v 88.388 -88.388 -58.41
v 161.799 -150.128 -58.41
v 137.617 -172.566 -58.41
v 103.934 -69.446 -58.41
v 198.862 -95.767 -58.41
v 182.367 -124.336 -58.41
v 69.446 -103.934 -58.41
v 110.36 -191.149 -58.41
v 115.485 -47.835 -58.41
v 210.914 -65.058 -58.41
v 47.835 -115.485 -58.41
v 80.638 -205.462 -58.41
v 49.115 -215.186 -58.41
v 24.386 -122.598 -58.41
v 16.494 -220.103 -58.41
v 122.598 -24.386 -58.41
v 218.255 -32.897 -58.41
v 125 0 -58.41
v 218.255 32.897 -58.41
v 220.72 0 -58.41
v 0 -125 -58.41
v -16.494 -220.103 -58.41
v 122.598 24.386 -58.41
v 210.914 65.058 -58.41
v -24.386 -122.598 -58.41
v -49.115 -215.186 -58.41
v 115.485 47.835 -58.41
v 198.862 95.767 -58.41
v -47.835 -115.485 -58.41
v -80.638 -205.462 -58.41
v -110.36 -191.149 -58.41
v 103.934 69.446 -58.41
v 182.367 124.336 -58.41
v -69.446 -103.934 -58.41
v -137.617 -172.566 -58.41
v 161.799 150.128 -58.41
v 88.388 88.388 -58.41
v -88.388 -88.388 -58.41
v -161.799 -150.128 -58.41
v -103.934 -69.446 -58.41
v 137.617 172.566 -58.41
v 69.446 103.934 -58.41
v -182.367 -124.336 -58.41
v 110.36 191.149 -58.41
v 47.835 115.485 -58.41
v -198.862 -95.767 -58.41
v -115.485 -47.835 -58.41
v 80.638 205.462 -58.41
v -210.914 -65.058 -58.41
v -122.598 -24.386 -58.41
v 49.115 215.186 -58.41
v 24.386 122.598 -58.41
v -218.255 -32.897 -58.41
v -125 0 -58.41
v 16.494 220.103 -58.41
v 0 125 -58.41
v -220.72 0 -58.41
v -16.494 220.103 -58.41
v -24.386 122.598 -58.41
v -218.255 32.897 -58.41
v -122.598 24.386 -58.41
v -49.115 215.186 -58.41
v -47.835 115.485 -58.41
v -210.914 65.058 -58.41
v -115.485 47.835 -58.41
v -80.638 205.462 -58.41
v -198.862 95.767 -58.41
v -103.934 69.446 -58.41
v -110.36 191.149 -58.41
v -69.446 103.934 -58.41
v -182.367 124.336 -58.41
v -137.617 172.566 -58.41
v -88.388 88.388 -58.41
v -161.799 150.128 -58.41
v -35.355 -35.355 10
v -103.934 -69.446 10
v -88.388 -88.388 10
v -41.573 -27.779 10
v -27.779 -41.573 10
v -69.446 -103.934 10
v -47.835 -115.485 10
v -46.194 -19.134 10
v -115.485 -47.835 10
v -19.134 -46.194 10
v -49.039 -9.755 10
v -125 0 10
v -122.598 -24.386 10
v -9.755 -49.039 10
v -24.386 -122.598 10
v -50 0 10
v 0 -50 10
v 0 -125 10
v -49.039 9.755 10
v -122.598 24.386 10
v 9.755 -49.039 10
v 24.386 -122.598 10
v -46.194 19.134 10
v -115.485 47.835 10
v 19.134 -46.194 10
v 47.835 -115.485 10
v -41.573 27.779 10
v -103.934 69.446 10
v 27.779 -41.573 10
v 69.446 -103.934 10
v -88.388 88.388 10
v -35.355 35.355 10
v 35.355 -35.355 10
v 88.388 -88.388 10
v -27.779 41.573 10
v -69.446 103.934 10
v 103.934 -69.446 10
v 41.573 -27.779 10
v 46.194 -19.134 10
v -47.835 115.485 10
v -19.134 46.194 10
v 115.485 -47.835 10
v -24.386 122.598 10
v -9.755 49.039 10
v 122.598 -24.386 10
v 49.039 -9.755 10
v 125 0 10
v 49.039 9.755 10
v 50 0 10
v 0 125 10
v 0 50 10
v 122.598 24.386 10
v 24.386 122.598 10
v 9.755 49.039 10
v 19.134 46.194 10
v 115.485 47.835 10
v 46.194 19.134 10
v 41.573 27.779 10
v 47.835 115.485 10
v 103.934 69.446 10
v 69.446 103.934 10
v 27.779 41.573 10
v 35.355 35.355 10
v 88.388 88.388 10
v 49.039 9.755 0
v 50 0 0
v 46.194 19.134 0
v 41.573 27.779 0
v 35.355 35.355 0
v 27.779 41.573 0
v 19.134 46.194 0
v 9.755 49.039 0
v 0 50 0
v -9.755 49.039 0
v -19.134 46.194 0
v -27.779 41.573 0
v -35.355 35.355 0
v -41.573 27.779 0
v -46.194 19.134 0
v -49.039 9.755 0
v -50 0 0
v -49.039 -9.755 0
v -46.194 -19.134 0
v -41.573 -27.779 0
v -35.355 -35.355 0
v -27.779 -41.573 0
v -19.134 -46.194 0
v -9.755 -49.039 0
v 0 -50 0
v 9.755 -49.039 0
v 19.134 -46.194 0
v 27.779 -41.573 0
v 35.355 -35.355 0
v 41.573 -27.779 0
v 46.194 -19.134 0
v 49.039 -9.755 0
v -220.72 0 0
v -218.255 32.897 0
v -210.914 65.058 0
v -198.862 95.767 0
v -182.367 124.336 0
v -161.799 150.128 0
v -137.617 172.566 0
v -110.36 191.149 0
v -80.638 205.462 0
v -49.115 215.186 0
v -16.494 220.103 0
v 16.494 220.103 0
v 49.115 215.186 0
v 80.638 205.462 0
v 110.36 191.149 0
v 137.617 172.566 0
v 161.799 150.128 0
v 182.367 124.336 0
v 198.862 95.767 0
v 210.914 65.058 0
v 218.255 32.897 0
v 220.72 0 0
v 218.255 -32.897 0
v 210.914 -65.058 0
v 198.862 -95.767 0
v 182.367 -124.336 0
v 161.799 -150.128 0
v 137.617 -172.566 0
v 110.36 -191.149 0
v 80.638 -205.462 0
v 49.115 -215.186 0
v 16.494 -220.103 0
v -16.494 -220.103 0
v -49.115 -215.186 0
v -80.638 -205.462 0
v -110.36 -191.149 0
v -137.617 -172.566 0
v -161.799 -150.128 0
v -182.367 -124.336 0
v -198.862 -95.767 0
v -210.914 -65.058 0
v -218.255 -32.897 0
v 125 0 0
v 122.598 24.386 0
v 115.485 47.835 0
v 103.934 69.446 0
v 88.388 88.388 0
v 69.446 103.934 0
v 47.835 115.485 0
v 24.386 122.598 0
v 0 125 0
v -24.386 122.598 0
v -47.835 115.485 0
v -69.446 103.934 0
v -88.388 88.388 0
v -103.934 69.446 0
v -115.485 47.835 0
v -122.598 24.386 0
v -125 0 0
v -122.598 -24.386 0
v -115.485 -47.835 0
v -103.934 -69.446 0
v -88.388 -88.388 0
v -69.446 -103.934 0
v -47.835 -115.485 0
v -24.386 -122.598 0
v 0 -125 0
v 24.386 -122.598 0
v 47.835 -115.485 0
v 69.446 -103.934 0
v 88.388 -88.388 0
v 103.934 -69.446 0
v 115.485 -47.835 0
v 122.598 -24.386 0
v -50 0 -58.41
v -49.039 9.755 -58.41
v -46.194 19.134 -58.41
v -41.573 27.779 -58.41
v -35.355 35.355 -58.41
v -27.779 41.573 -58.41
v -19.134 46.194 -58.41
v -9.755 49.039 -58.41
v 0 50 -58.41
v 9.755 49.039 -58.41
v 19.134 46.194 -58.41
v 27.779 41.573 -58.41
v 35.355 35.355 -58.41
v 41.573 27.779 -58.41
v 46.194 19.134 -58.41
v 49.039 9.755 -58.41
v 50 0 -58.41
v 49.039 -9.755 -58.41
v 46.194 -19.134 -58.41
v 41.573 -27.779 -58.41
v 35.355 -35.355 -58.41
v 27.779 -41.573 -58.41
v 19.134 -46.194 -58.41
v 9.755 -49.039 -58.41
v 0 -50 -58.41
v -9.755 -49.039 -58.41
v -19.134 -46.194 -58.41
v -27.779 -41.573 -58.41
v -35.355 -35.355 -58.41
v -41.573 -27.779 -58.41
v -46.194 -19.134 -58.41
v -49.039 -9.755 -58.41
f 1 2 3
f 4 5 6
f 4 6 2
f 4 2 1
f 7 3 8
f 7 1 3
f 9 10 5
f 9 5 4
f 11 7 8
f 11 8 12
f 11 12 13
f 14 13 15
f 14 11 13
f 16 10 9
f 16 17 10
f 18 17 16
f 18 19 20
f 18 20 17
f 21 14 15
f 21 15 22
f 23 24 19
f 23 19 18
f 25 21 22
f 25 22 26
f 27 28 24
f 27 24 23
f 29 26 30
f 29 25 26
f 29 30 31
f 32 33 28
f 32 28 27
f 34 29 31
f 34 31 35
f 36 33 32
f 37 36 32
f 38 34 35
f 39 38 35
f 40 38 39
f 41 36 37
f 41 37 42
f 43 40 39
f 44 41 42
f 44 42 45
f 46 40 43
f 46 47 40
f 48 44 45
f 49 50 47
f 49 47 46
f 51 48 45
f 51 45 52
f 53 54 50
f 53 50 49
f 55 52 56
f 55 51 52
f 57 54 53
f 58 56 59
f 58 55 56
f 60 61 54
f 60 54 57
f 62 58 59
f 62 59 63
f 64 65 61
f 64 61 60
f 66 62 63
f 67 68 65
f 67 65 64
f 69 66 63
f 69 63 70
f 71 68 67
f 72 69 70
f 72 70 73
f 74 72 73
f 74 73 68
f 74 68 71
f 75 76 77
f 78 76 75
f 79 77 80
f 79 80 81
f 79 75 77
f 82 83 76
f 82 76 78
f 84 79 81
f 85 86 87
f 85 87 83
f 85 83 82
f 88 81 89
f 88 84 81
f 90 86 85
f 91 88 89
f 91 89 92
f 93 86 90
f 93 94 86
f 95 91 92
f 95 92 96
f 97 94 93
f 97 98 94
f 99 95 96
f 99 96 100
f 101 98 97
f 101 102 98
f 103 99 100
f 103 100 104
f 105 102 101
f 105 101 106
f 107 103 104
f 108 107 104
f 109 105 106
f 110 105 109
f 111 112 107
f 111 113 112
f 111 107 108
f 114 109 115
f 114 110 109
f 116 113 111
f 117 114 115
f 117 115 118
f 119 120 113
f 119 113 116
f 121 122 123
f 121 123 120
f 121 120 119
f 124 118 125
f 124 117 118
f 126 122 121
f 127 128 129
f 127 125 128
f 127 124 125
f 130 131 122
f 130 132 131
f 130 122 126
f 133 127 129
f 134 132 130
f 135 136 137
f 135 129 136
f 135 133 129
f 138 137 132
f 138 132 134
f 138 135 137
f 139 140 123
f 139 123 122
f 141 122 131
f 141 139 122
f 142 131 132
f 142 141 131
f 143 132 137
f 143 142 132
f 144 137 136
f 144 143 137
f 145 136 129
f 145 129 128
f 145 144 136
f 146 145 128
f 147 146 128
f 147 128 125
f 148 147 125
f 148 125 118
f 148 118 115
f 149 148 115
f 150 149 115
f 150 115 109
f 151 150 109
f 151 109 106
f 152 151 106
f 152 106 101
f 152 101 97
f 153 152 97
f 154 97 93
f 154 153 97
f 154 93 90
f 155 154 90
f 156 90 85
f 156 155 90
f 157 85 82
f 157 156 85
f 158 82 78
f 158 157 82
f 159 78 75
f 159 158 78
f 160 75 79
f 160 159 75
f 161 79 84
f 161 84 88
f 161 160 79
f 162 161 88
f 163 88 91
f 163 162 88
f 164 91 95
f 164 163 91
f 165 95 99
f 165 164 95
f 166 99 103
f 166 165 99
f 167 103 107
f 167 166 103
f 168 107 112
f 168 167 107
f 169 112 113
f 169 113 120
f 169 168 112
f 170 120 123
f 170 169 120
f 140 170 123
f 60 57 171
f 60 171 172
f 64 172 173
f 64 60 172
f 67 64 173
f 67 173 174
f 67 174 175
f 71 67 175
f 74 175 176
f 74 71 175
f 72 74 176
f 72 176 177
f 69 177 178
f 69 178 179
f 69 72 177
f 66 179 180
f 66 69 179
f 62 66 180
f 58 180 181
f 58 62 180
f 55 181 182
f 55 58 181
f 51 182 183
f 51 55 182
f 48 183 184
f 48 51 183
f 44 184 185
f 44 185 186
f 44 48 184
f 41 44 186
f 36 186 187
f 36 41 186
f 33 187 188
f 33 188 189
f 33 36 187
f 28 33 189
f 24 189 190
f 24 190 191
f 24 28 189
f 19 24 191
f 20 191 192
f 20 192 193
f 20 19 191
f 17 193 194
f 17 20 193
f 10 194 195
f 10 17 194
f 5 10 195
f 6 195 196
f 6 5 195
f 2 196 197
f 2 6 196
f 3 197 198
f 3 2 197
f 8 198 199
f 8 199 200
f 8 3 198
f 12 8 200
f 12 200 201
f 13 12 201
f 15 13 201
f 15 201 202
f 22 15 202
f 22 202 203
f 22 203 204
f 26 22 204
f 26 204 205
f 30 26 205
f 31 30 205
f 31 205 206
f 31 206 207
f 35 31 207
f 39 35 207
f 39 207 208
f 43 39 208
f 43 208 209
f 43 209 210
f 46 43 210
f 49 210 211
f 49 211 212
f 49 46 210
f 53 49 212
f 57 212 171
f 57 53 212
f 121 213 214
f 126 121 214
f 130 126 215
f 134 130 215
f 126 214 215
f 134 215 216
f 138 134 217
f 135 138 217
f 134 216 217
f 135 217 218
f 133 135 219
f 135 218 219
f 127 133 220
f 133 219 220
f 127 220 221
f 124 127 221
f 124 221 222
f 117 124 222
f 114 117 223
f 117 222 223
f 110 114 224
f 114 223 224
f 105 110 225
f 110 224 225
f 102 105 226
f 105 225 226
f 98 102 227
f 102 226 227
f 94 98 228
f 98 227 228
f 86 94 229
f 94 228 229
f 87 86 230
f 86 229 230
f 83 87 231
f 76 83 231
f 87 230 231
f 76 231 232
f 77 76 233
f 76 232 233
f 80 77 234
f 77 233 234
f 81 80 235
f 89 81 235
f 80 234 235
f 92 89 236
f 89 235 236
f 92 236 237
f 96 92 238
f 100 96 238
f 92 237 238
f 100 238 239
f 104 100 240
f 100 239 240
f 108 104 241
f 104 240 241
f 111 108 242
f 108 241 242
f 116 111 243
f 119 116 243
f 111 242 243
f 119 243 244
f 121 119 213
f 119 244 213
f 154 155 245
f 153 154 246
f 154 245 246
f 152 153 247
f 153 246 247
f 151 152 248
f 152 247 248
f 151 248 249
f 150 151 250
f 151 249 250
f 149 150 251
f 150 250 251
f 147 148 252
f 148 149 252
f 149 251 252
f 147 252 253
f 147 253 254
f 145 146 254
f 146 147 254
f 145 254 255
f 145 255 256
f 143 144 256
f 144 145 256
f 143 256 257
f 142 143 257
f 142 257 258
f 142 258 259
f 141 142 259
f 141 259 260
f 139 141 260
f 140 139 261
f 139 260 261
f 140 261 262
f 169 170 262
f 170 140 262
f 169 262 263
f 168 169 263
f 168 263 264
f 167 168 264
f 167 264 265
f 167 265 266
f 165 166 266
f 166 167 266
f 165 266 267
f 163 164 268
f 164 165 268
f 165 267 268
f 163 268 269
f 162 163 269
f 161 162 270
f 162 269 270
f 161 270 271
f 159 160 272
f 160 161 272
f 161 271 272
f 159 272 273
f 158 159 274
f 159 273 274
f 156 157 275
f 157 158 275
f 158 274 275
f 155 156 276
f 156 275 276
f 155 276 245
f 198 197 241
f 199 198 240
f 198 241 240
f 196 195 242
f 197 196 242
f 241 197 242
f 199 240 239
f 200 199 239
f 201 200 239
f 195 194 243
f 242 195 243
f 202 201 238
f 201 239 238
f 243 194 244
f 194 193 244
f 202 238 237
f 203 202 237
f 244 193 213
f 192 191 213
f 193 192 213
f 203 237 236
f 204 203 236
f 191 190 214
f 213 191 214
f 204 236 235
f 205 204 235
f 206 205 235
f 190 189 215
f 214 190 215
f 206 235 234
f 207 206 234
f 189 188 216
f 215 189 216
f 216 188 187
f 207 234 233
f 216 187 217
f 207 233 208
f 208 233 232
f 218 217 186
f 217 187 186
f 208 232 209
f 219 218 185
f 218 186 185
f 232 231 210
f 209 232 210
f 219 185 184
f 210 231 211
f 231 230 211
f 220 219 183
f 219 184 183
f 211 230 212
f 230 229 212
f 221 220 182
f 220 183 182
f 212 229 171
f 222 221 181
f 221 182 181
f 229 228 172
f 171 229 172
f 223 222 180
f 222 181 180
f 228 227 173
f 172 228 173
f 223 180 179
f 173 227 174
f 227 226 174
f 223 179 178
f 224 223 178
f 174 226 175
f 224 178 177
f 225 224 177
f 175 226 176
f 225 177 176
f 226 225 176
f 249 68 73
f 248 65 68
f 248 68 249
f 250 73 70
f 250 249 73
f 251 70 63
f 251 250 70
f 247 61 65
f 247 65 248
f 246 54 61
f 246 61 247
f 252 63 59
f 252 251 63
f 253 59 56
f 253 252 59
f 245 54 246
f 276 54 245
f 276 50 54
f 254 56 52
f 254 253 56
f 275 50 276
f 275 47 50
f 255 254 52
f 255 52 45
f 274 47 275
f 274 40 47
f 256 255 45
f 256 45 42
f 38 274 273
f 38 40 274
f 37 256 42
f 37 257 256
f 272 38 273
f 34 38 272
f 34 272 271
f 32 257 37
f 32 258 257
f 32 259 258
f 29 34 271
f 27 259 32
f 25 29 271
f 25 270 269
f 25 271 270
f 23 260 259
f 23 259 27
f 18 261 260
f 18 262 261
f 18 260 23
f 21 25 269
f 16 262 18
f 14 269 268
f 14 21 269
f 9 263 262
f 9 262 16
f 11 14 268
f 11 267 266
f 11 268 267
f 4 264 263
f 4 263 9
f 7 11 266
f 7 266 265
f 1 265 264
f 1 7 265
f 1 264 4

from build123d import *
from build123d.topology import SkipClean

# Parameters (mm, degrees)
SKETCH1_R           = 125
SKETCH1_R_2         = 50
BOSS_EXTRUDE1_DEPTH = 10
BOSS_EXTRUDE2_START = 58.41
SKETCH2_R           = 220.72
SKETCH2_R_2         = 50
BOSS_EXTRUDE2_DEPTH = 58.41


with BuildPart() as part:
    # Sketch1 → Boss-Extrude1 (new body)
    with BuildSketch(Plane.XY):
        Circle(SKETCH1_R)
        Circle(SKETCH1_R_2, mode=Mode.SUBTRACT)
    extrude(amount=BOSS_EXTRUDE1_DEPTH)

    # Sketch2 → Boss-Extrude2 (add)
    with SkipClean():  # the faces are left unmerged after this step: merging them gives an invalid solid
        with BuildSketch(Plane(origin=(0, 0, 0), x_dir=(-1, 0, 0), z_dir=(0, 0, -1)).offset(BOSS_EXTRUDE2_START)):
            Circle(SKETCH2_R)
            Circle(SKETCH2_R_2, mode=Mode.SUBTRACT)
        extrude(amount=-BOSS_EXTRUDE2_DEPTH)


solid = part.part
